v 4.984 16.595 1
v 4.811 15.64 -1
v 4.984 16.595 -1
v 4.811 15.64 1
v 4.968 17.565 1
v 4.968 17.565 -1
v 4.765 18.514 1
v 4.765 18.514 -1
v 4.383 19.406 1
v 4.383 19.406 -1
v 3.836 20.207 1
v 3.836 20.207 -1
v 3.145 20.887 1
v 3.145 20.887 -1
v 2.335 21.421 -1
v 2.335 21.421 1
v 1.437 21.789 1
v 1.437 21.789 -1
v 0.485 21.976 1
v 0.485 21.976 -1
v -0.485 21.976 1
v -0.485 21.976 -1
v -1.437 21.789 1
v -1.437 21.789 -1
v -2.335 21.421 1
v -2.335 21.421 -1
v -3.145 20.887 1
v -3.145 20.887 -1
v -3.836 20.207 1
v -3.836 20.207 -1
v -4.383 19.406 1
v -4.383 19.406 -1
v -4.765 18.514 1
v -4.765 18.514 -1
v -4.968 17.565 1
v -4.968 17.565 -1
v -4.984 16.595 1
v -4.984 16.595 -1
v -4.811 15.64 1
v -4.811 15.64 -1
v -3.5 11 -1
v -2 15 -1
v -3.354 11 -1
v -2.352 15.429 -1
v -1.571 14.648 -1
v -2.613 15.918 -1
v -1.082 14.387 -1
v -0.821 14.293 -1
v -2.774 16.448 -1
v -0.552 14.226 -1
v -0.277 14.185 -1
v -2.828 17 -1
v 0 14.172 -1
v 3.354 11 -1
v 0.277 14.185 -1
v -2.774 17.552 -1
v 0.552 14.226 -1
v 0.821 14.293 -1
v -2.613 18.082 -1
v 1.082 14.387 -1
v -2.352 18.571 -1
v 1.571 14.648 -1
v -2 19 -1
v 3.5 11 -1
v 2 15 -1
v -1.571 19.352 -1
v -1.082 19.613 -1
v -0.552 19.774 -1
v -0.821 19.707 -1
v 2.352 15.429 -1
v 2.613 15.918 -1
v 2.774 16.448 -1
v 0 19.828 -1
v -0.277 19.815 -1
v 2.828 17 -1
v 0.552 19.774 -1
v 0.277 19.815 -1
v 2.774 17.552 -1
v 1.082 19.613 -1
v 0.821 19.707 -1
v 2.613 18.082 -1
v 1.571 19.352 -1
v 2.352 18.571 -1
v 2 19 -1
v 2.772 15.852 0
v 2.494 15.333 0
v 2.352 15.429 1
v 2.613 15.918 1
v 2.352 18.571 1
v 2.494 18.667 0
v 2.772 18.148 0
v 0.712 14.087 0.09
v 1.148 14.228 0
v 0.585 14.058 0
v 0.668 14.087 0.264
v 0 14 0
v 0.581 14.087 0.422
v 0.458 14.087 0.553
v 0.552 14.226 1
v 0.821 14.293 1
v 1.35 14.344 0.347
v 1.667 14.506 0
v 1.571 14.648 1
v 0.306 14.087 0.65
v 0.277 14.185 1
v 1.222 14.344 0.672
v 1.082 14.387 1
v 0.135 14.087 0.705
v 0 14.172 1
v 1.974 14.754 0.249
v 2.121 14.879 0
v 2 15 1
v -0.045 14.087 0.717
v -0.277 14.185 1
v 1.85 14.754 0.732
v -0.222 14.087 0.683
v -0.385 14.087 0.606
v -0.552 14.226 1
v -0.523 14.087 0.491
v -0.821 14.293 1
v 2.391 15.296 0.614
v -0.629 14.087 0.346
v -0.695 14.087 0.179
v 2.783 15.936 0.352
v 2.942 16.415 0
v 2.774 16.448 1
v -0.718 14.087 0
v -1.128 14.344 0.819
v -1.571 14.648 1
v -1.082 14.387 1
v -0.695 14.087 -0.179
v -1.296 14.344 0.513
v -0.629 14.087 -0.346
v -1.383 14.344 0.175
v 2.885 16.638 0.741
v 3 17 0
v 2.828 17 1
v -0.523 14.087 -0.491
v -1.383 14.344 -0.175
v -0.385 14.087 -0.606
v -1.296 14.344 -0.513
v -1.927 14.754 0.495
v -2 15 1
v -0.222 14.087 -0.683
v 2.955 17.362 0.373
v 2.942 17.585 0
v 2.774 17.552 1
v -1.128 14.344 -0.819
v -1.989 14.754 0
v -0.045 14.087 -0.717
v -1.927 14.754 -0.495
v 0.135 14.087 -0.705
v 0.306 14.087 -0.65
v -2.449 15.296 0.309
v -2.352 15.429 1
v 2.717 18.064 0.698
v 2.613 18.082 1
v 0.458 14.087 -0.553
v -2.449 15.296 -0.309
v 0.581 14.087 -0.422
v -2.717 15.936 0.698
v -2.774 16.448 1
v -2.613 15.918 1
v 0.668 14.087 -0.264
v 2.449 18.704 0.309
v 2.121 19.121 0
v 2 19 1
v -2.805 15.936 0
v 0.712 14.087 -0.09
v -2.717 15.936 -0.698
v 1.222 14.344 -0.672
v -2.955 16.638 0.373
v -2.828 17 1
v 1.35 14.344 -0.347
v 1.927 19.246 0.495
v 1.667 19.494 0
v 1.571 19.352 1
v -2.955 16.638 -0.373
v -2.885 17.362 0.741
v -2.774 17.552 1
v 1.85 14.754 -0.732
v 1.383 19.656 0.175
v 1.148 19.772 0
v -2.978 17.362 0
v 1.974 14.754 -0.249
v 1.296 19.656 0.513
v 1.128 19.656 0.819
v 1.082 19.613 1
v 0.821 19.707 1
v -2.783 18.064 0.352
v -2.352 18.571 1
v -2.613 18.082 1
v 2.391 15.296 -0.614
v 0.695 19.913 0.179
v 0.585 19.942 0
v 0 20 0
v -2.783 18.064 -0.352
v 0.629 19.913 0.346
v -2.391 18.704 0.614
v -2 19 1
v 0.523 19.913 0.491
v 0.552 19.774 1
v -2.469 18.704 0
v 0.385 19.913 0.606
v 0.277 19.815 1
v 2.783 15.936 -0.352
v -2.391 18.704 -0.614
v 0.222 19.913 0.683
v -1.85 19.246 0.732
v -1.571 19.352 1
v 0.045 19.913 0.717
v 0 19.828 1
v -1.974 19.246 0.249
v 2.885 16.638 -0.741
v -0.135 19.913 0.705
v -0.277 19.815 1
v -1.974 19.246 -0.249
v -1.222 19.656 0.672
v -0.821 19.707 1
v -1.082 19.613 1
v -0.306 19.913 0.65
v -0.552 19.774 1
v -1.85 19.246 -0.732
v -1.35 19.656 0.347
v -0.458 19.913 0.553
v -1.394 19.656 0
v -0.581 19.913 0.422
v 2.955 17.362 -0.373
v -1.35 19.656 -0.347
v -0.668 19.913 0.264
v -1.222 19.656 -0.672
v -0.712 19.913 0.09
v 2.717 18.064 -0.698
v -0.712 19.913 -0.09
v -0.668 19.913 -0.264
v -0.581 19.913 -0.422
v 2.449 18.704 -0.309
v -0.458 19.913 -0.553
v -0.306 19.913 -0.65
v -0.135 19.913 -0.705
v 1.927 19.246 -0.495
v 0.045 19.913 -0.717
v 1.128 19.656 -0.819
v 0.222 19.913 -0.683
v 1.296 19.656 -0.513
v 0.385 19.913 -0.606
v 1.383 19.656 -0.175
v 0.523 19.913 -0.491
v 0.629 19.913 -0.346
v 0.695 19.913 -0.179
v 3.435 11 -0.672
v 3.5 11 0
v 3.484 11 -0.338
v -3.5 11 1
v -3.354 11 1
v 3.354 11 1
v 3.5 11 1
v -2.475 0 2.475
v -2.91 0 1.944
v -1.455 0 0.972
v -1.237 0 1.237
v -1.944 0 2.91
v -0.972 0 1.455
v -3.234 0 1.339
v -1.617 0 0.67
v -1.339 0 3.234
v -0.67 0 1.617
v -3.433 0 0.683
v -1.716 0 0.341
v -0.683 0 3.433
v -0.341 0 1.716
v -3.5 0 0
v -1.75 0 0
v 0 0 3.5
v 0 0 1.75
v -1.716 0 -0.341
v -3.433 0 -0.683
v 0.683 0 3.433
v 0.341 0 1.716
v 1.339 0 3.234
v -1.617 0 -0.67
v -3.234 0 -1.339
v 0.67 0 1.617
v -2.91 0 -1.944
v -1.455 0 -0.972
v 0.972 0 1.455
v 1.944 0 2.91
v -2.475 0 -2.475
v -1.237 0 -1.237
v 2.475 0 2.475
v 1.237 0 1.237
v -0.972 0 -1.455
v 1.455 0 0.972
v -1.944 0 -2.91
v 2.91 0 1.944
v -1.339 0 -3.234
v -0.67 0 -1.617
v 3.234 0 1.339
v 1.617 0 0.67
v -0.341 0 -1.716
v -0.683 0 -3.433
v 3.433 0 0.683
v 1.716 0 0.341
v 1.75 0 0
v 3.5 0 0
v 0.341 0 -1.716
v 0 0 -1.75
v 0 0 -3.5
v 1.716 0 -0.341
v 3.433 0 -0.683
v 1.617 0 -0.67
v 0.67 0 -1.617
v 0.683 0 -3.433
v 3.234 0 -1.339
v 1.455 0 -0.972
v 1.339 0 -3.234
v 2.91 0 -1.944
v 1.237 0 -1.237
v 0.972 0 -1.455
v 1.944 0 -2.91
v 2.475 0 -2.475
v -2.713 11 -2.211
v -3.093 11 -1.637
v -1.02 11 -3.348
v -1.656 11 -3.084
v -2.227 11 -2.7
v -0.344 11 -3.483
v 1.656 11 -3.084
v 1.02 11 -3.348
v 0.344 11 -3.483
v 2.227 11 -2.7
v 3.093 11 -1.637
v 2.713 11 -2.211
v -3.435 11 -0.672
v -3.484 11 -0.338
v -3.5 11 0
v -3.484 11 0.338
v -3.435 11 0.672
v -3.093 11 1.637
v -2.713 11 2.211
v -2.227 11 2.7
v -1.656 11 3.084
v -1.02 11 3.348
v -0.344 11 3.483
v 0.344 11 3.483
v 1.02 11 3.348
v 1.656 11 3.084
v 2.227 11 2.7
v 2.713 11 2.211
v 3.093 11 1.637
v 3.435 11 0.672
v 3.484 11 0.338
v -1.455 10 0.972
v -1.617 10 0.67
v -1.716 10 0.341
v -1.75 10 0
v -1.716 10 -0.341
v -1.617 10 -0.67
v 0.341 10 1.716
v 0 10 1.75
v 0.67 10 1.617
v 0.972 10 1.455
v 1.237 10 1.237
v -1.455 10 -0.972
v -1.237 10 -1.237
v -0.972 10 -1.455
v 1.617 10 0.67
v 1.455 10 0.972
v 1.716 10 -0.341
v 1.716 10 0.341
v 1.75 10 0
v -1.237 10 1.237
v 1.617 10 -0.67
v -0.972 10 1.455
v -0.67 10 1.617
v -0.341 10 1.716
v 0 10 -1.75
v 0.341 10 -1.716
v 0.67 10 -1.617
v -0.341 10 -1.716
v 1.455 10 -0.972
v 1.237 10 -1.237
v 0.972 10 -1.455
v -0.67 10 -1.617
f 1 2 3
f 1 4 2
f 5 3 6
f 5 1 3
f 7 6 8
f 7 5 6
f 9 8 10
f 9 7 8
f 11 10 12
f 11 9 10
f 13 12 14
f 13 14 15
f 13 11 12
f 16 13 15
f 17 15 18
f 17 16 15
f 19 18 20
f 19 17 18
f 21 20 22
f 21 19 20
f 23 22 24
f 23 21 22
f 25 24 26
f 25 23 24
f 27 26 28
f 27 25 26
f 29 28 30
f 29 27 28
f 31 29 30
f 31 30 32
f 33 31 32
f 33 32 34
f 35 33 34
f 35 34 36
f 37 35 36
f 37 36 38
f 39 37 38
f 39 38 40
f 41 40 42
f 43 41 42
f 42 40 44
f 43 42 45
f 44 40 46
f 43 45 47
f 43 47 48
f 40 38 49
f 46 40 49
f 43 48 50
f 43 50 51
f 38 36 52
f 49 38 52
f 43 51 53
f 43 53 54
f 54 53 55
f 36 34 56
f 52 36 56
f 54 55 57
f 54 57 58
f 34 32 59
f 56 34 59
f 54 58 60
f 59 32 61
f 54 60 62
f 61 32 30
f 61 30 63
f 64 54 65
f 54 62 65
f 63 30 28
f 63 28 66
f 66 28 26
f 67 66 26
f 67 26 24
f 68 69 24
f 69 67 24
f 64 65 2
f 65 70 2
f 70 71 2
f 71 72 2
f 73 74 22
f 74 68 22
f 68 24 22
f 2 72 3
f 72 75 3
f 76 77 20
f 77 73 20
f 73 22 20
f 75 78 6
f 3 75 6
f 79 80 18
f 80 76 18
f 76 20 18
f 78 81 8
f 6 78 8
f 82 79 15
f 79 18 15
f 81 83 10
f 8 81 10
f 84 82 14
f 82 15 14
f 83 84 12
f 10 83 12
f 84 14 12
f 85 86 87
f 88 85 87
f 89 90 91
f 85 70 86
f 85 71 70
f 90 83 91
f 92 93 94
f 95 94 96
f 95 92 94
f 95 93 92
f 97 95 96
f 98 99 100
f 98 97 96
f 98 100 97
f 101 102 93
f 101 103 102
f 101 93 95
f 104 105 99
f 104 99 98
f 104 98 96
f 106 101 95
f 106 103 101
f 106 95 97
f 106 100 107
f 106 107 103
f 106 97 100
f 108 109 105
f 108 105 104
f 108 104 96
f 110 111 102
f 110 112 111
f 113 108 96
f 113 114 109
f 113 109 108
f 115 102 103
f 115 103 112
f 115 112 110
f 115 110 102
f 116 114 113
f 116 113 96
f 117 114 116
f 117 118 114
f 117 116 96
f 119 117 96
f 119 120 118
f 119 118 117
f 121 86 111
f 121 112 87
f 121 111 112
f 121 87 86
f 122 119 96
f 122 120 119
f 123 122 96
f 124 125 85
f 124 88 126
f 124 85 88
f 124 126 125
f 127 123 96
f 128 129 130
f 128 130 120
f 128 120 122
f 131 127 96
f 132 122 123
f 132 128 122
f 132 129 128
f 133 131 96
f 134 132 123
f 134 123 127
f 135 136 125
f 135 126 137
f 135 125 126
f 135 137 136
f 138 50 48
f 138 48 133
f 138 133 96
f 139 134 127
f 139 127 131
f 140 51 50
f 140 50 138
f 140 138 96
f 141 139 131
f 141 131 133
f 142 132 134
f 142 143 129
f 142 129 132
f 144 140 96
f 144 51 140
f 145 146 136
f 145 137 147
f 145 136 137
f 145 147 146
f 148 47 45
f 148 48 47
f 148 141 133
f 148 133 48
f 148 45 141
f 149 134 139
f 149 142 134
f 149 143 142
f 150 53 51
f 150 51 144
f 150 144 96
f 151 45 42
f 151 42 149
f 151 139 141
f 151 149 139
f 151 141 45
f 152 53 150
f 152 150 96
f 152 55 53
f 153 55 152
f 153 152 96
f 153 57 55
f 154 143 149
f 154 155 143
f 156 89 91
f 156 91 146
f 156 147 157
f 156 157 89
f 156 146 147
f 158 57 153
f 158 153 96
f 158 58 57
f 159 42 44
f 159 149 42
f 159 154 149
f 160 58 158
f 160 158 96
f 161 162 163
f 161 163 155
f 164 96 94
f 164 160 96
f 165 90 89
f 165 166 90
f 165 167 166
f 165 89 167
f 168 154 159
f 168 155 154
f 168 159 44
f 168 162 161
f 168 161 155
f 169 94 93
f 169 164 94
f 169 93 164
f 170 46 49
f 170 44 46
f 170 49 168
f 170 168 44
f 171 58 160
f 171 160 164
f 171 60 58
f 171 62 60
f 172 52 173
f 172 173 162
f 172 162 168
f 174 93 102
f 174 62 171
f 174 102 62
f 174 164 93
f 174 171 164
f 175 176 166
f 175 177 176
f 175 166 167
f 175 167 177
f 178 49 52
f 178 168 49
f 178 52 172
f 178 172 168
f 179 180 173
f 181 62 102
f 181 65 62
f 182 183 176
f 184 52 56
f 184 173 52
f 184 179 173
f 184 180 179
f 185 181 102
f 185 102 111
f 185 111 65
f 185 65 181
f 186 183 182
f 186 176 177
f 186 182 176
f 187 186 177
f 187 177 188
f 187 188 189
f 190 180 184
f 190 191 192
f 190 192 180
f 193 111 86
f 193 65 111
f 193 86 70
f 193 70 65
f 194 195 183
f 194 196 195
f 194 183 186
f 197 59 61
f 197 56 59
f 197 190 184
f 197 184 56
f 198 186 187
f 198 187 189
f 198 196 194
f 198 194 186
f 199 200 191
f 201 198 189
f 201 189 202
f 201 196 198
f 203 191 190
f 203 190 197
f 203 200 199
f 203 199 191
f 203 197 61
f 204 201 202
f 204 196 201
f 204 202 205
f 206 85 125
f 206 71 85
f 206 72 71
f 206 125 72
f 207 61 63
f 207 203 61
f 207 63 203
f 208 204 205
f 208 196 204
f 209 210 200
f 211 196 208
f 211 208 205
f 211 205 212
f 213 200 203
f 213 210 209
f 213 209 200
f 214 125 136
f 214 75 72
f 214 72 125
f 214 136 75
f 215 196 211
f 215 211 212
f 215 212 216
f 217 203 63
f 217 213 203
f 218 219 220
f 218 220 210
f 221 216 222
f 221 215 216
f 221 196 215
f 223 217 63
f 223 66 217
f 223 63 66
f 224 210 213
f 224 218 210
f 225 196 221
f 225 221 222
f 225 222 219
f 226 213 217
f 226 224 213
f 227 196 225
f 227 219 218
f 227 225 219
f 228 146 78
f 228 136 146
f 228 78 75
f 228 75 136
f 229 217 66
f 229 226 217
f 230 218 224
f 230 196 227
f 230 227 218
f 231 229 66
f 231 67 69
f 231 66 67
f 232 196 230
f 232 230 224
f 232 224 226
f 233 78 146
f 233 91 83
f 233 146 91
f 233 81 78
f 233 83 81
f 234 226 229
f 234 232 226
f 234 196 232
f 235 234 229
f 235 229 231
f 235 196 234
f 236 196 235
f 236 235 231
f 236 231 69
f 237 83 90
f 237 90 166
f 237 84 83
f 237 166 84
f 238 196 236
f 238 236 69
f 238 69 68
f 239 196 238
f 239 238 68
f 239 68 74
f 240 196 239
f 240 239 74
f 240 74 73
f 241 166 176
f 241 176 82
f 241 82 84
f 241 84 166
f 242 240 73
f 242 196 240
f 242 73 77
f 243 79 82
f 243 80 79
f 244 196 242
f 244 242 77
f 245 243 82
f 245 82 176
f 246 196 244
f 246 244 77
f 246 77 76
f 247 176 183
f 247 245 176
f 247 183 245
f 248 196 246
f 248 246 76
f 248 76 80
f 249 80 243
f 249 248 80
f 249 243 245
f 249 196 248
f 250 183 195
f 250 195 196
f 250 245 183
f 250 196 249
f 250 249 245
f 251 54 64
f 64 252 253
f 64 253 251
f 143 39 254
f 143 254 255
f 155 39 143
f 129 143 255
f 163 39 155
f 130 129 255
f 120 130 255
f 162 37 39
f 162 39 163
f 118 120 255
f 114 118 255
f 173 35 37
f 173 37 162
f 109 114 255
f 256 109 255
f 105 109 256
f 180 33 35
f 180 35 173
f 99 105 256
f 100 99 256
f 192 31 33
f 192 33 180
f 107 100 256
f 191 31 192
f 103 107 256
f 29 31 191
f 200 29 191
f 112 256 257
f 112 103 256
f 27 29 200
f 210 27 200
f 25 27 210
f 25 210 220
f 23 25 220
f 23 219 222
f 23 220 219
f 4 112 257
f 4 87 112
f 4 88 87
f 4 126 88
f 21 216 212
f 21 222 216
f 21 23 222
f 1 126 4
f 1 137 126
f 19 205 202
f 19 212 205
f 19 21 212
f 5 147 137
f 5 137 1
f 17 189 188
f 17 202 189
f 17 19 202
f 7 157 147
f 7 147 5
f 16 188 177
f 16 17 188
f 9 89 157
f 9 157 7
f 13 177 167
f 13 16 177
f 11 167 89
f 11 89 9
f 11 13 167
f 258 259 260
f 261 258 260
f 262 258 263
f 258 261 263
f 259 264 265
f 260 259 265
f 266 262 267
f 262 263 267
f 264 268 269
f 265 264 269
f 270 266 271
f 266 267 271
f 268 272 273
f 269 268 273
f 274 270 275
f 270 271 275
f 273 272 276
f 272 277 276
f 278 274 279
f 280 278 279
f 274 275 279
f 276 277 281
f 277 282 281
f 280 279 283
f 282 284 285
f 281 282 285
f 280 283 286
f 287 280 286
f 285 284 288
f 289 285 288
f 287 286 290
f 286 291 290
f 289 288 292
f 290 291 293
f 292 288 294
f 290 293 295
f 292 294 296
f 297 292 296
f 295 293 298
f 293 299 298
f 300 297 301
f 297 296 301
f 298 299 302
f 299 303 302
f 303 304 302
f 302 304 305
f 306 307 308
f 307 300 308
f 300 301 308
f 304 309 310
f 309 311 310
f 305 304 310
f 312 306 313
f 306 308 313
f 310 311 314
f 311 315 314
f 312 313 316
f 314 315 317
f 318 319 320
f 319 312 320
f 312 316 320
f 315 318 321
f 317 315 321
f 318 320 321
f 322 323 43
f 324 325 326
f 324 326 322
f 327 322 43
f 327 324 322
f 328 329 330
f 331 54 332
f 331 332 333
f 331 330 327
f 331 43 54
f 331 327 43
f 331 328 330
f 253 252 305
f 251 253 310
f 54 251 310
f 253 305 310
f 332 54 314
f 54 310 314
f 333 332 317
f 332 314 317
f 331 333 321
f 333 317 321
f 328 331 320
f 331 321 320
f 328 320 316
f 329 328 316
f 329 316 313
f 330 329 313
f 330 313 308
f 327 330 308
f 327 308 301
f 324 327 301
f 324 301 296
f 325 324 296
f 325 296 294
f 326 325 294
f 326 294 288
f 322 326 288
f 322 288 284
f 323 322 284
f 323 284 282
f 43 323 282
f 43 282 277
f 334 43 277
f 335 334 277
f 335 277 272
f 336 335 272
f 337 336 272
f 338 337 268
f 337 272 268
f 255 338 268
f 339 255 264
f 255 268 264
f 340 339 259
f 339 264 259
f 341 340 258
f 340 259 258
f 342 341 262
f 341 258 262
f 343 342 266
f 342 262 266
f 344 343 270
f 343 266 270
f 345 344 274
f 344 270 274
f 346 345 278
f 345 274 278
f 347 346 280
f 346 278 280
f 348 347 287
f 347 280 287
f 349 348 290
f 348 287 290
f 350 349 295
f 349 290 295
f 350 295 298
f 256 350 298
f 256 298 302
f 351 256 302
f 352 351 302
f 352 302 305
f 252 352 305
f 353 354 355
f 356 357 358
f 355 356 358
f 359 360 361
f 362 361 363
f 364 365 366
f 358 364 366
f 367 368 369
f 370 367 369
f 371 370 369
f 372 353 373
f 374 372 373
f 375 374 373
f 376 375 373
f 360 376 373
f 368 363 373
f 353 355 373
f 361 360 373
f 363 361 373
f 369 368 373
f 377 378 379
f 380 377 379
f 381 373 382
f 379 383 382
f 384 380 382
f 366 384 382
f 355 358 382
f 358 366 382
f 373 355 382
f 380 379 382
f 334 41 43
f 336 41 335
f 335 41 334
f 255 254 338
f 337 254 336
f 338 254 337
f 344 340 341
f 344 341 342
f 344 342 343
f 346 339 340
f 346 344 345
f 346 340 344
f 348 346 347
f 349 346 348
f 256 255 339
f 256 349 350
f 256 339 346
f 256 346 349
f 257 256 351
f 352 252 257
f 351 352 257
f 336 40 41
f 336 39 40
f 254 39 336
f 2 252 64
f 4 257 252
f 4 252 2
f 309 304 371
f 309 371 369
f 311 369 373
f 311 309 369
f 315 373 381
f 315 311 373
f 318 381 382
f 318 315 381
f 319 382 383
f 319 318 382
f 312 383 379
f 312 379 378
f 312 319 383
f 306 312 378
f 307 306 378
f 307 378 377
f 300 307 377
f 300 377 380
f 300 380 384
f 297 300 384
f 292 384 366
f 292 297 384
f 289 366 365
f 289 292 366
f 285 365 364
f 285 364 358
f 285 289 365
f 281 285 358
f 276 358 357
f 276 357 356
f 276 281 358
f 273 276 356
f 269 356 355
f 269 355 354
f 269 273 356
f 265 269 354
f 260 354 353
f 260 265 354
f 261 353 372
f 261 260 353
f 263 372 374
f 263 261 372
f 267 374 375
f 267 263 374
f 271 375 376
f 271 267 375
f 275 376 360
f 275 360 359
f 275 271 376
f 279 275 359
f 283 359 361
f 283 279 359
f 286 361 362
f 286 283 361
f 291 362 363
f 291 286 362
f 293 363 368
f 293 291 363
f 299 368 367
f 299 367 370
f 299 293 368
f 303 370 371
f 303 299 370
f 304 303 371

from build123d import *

# Parameters (mm, degrees)
SKETCH1_R                = 3.5
SKETCH1_R_2              = 1.75
BOSS_EXTRUDE1_DEPTH      = 10
SKETCH3_R                = 3.5
BOSS_EXTRUDE2_DEPTH      = 1
BOSS_EXTRUDE3_DEPTH      = 1
BOSS_EXTRUDE3_DEPTH_BACK = 1


with BuildPart() as part:
    # Sketch1 → Boss-Extrude1 (new body)
    with BuildSketch(Plane(origin=(0, 0, 0), x_dir=(1, 0, 0), z_dir=(0, 1, 0))):
        Circle(SKETCH1_R)
        Circle(SKETCH1_R_2, mode=Mode.SUBTRACT)
    extrude(amount=BOSS_EXTRUDE1_DEPTH)

    # Sketch3 → Boss-Extrude2 (add)
    with BuildSketch(Plane(origin=(0, 10, 0), x_dir=(1, 0, 0), z_dir=(0, 1, 0))):
        Circle(SKETCH3_R)
    extrude(amount=BOSS_EXTRUDE2_DEPTH)

    # Sketch2 → Boss-Extrude3 (add, two sides: drawn at the far end of the back side and taken through both)
    with BuildSketch(Plane.XY.offset(-BOSS_EXTRUDE3_DEPTH_BACK)):
        with BuildLine():
            Line((-4.811497646, 15.640040293), (-3.5, 11))
            Line((-3.5, 11), (3.5, 11))
            Line((3.5, 11), (4.811497646, 15.640040293))
            ThreePointArc((4.811497646, 15.640040293), (0, 22), (-4.811497646, 15.640040293))
        make_face()
    extrude(amount=BOSS_EXTRUDE3_DEPTH + BOSS_EXTRUDE3_DEPTH_BACK)

    # Sketch4 → Cut-Revolve1 (revolve, cut)
    with BuildSketch(Plane.XY):
        with BuildLine():
            Line((0, 20), (0, 14))
            ThreePointArc((0, 14), (3, 17), (0, 20))
        make_face()
    revolve(axis=Axis((0, 22, 0), (0, -1, 0)), mode=Mode.SUBTRACT)


solid = part.part
